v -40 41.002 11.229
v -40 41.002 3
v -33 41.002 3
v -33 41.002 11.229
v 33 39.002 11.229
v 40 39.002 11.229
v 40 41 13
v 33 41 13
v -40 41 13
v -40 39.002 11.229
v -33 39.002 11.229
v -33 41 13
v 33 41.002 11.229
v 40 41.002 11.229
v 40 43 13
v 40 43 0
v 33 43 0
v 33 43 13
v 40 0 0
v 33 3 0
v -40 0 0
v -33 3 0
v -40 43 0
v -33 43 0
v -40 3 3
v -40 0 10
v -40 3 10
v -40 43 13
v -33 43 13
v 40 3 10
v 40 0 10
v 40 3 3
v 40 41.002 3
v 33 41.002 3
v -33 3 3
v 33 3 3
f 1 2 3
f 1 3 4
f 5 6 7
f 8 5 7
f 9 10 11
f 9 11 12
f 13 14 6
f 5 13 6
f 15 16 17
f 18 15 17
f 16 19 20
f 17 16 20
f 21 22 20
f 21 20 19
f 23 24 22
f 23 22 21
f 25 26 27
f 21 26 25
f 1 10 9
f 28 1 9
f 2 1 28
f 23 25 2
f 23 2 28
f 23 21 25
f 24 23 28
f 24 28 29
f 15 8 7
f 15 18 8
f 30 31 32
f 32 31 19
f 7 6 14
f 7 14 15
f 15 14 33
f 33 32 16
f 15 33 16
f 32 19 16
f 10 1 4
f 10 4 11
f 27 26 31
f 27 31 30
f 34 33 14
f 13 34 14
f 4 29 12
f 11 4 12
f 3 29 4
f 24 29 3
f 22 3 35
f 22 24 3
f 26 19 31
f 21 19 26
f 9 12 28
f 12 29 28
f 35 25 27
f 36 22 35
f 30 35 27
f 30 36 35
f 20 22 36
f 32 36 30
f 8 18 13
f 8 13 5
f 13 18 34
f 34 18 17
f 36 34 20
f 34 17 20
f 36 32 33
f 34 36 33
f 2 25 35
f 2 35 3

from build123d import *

# Parameters (mm, degrees)
BOSS_EXTRUDE1_DEPTH = 13
CUT_EXTRUDE1_DEPTH  = 100


with BuildPart() as part:
    # Sketch1 → Boss-Extrude1 (new body)
    with BuildSketch(Plane.XY):
        Polygon((0, 0), (40, 0), (40, 43), (33, 43), (33, 3), (0, 3), align=None)
    extrude(amount=BOSS_EXTRUDE1_DEPTH)

    # Sketch2 → Cut-Extrude1 (cut)
    with BuildSketch(Plane(origin=(40, 0, 0), x_dir=(0, 0, -1), z_dir=(1, 0, 0))):
        Polygon((-11.229441325, 39.002032062), (-13, 41), (-13, 0), (-10, 0), (-10, 3), (-3, 3), (-3, 41.002032062), (-11.229441325, 41.002032062), align=None)
    extrude(amount=-CUT_EXTRUDE1_DEPTH, mode=Mode.SUBTRACT)

    # Mirror2: part across plane


with BuildPart() as part_1:
    add(part.part)
    add(part.part.mirror(Plane(origin=(0, 0, 13), x_dir=(0, 0, 1), z_dir=(1, 0, 0))))


solid = part_1.part
